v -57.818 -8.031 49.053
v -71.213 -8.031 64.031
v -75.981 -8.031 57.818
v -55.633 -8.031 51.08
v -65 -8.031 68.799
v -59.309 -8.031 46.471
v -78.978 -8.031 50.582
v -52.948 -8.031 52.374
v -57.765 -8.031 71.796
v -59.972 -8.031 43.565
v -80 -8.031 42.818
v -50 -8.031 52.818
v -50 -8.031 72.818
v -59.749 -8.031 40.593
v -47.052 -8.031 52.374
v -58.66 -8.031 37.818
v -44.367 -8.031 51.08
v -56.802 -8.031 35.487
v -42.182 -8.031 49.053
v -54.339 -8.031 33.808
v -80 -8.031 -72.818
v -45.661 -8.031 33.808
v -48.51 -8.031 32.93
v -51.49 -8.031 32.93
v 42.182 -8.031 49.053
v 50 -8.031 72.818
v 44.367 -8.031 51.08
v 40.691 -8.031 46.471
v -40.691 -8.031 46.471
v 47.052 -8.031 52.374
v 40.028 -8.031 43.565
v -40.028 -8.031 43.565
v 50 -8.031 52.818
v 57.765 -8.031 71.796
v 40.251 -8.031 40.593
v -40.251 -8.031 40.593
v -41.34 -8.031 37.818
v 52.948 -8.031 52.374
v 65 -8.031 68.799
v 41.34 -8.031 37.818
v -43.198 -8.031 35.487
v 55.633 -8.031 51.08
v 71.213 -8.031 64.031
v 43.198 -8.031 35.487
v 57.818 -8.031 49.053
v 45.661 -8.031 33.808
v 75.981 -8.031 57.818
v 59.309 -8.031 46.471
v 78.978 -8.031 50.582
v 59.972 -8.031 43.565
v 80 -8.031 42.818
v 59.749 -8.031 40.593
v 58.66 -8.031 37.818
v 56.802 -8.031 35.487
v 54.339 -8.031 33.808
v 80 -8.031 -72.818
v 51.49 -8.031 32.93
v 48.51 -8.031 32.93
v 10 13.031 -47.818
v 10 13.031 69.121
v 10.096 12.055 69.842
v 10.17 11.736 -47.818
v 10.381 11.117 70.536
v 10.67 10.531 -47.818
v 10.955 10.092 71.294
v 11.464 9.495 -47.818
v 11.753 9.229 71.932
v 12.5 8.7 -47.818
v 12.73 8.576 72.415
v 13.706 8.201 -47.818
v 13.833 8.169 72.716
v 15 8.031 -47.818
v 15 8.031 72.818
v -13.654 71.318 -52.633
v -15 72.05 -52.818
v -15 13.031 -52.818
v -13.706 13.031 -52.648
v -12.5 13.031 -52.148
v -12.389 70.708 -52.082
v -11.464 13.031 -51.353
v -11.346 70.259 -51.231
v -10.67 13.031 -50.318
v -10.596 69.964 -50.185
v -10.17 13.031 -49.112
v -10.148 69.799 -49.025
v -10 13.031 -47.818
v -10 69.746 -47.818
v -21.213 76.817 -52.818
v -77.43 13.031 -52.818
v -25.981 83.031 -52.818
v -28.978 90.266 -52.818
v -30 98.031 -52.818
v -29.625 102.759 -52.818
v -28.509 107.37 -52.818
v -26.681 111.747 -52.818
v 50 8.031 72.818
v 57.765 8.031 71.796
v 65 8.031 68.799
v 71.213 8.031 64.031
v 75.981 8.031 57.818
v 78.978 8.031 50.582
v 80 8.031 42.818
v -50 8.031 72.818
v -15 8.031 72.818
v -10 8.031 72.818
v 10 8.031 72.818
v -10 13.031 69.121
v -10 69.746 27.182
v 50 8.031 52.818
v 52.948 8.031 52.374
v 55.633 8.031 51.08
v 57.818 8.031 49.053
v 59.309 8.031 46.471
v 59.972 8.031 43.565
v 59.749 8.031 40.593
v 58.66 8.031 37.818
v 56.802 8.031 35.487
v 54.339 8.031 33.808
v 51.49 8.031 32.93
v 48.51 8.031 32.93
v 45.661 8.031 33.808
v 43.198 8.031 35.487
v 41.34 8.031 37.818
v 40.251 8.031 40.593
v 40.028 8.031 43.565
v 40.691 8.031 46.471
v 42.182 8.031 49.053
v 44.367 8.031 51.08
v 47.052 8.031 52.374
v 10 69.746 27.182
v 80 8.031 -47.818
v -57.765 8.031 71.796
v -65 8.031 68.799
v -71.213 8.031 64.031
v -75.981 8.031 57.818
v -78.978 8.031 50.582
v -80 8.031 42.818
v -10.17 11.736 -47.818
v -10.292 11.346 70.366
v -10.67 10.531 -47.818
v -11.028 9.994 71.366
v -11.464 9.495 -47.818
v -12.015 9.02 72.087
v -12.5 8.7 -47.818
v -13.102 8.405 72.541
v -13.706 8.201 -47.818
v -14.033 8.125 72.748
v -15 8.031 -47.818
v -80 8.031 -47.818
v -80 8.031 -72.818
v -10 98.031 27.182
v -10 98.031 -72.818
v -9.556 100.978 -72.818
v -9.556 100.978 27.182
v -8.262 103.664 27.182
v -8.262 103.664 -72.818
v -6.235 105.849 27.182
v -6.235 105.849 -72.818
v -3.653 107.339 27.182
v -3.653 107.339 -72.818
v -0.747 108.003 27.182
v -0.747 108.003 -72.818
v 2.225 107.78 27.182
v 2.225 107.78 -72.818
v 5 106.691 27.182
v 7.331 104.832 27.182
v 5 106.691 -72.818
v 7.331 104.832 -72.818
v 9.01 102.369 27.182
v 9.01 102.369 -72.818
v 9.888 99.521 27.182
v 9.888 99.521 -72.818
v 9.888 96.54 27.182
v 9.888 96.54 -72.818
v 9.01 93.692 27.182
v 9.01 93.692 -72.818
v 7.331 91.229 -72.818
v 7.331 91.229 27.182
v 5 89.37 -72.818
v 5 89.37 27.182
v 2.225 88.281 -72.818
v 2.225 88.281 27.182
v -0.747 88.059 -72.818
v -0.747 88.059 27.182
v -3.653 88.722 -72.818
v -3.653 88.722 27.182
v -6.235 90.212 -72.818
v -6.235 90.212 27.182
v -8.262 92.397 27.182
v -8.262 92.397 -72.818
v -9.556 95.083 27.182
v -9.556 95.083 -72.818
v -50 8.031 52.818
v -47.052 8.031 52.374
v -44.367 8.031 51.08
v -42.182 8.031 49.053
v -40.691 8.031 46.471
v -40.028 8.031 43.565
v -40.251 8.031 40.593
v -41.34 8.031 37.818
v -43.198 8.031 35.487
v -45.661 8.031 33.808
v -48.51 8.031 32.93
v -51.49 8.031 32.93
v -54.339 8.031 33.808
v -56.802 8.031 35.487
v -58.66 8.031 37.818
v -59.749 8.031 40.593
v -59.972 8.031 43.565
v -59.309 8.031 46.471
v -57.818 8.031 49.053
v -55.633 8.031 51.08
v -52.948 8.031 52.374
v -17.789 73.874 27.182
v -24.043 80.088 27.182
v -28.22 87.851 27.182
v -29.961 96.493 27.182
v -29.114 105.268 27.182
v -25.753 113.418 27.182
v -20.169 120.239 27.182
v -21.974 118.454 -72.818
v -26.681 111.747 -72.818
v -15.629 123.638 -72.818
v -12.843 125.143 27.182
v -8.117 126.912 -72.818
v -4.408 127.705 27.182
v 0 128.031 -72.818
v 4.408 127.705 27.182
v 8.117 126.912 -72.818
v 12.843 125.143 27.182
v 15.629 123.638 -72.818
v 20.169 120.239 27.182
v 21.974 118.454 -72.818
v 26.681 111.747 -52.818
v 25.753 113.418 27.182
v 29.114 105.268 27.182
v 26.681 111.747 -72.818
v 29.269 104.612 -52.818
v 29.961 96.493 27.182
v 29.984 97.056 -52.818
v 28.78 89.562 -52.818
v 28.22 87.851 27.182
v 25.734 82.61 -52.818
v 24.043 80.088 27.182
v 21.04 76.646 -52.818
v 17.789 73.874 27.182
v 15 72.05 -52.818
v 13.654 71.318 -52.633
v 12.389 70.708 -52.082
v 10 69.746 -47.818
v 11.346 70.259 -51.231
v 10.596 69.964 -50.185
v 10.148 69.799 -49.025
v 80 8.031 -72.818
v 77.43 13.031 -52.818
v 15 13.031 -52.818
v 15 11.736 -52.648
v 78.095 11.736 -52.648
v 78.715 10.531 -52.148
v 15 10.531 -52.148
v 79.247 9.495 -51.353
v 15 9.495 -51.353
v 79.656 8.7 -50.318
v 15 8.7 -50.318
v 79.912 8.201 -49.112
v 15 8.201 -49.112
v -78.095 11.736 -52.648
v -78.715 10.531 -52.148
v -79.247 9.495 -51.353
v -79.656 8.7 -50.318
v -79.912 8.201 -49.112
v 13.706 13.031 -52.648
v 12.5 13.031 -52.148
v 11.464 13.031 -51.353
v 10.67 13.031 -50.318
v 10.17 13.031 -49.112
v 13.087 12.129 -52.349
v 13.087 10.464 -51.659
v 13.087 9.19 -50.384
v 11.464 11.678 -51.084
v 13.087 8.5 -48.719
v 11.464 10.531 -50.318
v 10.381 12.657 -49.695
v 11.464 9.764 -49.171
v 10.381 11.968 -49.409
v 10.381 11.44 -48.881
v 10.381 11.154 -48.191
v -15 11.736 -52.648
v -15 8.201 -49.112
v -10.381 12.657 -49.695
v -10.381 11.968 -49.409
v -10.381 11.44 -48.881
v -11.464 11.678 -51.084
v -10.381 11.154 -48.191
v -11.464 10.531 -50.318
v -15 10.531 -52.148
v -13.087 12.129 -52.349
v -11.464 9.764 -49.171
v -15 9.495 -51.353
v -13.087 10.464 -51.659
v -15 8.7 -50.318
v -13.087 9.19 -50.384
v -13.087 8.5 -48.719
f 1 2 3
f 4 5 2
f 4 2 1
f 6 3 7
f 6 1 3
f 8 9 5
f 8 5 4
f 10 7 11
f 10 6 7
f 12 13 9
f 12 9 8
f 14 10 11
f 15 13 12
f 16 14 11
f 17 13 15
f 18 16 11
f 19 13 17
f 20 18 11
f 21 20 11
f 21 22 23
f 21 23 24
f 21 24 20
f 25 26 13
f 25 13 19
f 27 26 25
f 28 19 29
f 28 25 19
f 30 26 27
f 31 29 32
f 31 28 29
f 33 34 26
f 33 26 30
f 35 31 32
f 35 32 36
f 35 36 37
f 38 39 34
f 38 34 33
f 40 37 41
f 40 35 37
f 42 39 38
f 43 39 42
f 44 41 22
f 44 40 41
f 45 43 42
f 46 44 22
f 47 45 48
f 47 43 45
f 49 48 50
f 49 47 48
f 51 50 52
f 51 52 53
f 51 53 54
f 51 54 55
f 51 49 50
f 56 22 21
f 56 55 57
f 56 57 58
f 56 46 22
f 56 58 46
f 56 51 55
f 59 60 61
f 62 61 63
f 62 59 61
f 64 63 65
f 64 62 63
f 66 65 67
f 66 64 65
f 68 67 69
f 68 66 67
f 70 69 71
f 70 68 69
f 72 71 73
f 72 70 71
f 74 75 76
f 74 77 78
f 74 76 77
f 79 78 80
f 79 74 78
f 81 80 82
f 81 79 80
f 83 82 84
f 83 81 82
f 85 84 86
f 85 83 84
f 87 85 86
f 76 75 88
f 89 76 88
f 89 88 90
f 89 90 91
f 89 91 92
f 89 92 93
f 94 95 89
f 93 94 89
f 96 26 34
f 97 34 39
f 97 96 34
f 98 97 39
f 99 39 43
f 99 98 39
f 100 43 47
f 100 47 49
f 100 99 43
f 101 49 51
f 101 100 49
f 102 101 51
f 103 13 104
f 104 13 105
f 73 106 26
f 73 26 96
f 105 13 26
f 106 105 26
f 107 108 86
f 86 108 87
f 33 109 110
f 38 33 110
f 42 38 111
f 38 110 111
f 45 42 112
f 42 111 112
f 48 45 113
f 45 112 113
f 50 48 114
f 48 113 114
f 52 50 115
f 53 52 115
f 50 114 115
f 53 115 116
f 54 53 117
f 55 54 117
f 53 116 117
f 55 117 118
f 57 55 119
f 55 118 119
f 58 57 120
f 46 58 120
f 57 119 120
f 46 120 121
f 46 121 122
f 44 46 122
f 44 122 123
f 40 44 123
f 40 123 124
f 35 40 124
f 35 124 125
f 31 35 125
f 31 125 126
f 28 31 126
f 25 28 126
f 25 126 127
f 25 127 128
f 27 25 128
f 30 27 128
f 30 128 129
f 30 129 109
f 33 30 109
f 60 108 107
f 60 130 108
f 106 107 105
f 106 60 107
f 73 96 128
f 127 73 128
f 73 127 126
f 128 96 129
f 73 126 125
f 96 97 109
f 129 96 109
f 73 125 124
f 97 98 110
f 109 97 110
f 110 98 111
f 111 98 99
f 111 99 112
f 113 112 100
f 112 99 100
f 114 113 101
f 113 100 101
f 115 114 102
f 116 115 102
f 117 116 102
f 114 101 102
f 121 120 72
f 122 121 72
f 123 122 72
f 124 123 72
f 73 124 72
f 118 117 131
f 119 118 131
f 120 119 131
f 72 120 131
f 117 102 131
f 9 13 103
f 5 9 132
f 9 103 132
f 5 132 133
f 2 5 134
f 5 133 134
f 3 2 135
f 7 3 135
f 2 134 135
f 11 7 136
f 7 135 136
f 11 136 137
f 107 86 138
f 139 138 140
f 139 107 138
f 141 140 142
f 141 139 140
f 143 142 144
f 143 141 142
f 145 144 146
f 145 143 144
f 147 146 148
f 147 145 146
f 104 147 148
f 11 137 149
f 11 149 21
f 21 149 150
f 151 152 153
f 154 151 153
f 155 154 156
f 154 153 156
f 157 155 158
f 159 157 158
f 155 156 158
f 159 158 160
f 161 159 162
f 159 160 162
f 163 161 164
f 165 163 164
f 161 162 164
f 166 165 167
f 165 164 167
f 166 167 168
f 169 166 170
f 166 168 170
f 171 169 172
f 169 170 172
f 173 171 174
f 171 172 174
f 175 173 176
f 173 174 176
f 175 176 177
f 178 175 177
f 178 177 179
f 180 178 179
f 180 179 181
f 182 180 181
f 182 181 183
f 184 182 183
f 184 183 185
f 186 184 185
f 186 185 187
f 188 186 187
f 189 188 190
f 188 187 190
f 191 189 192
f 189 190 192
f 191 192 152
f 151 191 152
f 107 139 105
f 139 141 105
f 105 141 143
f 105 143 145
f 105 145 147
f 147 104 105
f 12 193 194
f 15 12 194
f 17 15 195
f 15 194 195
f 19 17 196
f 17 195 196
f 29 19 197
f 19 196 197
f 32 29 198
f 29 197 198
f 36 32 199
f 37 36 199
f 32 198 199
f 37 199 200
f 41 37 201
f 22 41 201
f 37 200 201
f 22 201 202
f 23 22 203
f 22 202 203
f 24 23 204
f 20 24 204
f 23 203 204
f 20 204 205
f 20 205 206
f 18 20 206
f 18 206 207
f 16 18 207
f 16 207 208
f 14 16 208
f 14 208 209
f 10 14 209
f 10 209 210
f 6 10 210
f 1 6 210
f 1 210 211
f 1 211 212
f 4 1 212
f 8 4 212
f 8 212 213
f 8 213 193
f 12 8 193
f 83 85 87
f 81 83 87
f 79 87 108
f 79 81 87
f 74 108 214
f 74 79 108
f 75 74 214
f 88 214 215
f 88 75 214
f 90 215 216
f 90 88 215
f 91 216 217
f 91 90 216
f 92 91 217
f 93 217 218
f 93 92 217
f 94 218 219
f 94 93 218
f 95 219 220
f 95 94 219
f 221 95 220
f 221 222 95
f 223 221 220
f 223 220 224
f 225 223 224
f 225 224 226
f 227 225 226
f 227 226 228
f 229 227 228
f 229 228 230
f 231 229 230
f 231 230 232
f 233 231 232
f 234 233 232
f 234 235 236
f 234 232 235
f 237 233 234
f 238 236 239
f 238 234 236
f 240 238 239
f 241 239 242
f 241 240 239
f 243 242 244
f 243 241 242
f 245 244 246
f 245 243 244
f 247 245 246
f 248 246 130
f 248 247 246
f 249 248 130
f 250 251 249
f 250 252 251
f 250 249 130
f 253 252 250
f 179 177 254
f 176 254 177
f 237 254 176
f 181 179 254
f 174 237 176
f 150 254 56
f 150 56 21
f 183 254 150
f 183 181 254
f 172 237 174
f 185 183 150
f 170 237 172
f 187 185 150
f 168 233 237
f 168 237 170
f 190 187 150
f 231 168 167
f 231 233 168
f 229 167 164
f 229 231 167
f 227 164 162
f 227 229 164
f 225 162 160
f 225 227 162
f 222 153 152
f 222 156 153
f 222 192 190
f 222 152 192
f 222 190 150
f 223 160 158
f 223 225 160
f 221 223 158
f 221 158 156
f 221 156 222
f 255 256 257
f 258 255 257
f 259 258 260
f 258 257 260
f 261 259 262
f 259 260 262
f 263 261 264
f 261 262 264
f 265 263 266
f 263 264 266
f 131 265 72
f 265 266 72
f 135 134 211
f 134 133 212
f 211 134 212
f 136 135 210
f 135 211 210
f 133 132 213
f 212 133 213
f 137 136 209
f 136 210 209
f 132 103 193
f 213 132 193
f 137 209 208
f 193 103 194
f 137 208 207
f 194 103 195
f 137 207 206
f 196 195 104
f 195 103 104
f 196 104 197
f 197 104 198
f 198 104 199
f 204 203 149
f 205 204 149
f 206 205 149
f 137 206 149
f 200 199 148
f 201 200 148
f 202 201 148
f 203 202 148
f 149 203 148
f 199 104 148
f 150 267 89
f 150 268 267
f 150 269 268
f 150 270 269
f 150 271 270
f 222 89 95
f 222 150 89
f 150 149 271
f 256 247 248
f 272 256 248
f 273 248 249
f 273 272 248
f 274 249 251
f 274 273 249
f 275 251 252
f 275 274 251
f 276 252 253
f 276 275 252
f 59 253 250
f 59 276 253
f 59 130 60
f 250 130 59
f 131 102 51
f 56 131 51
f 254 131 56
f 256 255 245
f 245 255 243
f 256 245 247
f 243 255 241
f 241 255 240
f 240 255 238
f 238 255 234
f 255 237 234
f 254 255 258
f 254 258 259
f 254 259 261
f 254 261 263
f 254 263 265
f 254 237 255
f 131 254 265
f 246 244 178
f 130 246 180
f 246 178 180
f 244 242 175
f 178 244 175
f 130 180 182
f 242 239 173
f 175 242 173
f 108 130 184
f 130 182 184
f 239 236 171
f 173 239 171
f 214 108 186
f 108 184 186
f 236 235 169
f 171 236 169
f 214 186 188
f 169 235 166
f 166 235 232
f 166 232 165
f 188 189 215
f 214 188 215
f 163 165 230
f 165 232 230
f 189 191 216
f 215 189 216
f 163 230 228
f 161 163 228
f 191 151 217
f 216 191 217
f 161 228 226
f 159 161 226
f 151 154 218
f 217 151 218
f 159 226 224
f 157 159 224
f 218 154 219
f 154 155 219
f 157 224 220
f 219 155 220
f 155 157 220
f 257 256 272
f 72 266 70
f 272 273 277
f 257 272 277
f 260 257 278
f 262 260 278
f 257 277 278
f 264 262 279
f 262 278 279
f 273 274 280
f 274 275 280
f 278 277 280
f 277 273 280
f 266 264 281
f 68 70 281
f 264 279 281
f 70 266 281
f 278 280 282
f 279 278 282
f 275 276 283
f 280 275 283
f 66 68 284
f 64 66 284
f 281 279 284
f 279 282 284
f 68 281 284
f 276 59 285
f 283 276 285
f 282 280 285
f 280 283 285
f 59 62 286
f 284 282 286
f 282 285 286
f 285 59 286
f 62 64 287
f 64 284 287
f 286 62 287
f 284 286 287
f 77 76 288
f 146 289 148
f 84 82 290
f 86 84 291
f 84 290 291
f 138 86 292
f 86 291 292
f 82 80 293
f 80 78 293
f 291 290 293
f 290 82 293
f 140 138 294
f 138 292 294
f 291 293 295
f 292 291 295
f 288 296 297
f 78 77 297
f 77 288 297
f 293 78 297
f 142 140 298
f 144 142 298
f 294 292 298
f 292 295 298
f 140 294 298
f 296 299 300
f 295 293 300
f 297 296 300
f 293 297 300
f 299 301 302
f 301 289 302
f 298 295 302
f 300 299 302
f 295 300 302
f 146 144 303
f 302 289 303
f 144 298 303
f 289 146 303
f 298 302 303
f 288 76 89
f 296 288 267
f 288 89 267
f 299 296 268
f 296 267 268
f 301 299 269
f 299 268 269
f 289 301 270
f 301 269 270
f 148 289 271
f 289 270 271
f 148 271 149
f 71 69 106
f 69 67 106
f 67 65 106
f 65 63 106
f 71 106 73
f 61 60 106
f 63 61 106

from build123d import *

# Parameters (mm, degrees)
SKETCH2_W            = 145.63575991
SKETCH2_H            = 16.06113598
BOSS_EXTRUDE1_DEPTH  = 80
SKETCH3_R            = 10
CUT_EXTRUDE1_DEPTH   = 110.363630747
BOSS_EXTRUDE2_DEPTH  = 20
SKETCH5_R            = 30
SKETCH5_R_2          = 10
BOSS_EXTRUDE3_DEPTH  = 100
FILLET1_R            = 5
BOSS_EXTRUDE9_REACH  = 183.085
BOSS_EXTRUDE10_DEPTH = 10
FILLET2_R            = 5
FILLET3_R            = 30


with BuildPart() as part:
    # Sketch2 → Boss-Extrude1 (new, symmetric)
    with BuildSketch(Plane(origin=(0, 0, 0), x_dir=(0, 0, -1), z_dir=(1, 0, 0))):
        Rectangle(SKETCH2_W, SKETCH2_H)
    extrude(amount=BOSS_EXTRUDE1_DEPTH, both=True)

    # Sketch3 → Cut-Extrude1 (cut, through all)
    with BuildSketch(Plane(origin=(0, 8.03056799, 0), x_dir=(1, 0, 0), z_dir=(0, 1, 0))):
        with Locations(Location((50, -42.817879955, 0), (0, 0, 270))):
            Circle(SKETCH3_R)
        with Locations(Location((-50, -42.817879955, 0), (0, 0, 270))):
            Circle(SKETCH3_R)
    extrude(amount=-CUT_EXTRUDE1_DEPTH, mode=Mode.SUBTRACT)

    # Sketch4 → Boss-Extrude2 (add)
    with BuildSketch(Plane(origin=(0, 0, -72.817879955), x_dir=(-1, 0, 0), z_dir=(0, 0, -1))):
        with BuildLine():
            Line((-26.680786367, 111.746822538), (-80, 8.03056799))
            Line((-80, 8.03056799), (80, 8.03056799))
            Line((80, 8.03056799), (26.680786367, 111.746822538))
            ThreePointArc((26.680786367, 111.746822538), (29.158391511, 105.086643705), (30, 98.03056799))
            ThreePointArc((30, 98.03056799), (-7.056075715, 68.872176479), (-26.680786367, 111.746822538))
        make_face()
    extrude(amount=-BOSS_EXTRUDE2_DEPTH)

    # Sketch5 → Boss-Extrude3 (add)
    with BuildSketch(Plane(origin=(0, 0, -72.817879955), x_dir=(-1, 0, 0), z_dir=(0, 0, -1))):
        with Locations((0, 98.03056799)):
            Circle(SKETCH5_R)
        with Locations((0, 98.03056799)):
            Circle(SKETCH5_R_2, mode=Mode.SUBTRACT)
    extrude(amount=-BOSS_EXTRUDE3_DEPTH)

    # Fillet1
    fillet1_edges = [part.edges().sort_by_distance(p)[0] for p in [
        (0, 8.03056799, -52.817879955),
    ]]
    fillet(fillet1_edges, radius=FILLET1_R)

    # Boss-Extrude9: up to this face of the body (flat: up to its plane)
    boss_extrude9_end = Plane(part.part.faces().sort_by_distance((0, 43.997298741, -52.817879955))[0])
    # Sketch12 → Boss-Extrude9 (add, up to the picked face)
    with BuildSketch(Plane.XY.offset(27.182120045), mode=Mode.PRIVATE) as boss_extrude9_sk1:
        with BuildLine():
            Line((10, 69.746296743), (10, 8.03056799))
            Line((10, 8.03056799), (-10, 8.03056799))
            Line((-10, 8.03056799), (-10, 69.746296743))
            ThreePointArc((-10, 69.746296743), (0, 68.03056799), (10, 69.746296743))
        make_face()
    boss_extrude9_tool1 = split(extrude(boss_extrude9_sk1.sketch, amount=-BOSS_EXTRUDE9_REACH, mode=Mode.PRIVATE), bisect_by=boss_extrude9_end, keep=Keep.BOTH, mode=Mode.PRIVATE)
    add(boss_extrude9_tool1.solids().sort_by(Axis((0, 38.315311, 27.18212), (0, 0, -1)))[0])

    # Sketch14 → Boss-Extrude10 (add, symmetric)
    with BuildSketch(Plane(origin=(0, 0, 0), x_dir=(0, 0, -1), z_dir=(1, 0, 0))):
        Polygon((-27.182120045, 69.746296743), (-72.817879955, 8.03056799), (-27.182120045, 8.03056799), align=None)
    extrude(amount=BOSS_EXTRUDE10_DEPTH, both=True)

    # Fillet2
    # the kernel refuses this fillet: 5 mm, written as the material it adds along each edge
    with BuildSketch(Plane(origin=(10, 13.03056799, -47.817879955), x_dir=(0, 0, -1), z_dir=(0, 1, 0))) as fillet2_piece_1:
        with BuildLine():
            CenterArc((5 - FILLET2_R, -FILLET2_R), FILLET2_R, 0, 90)
            Line((5, -FILLET2_R), (5, 0))
            Line((5, 0), (5 - FILLET2_R, 0))
        make_face()
    revolve(axis=Axis((10, 13.03056799, -47.817879955), (-1, 0, 0)), revolution_arc=90)
    with BuildSketch(Plane(origin=(-10, 13.03056799, -47.817879955), x_dir=(0, 0, -1), z_dir=(0, 1, 0))) as fillet2_piece_2:
        with BuildLine():
            CenterArc((5 - FILLET2_R, FILLET2_R), FILLET2_R, 270, 90)
            Line((5, FILLET2_R), (5, 0))
            Line((5, 0), (5 - FILLET2_R, 0))
        make_face()
    revolve(axis=Axis((-10, 13.03056799, -47.817879955), (-1, 0, 0)), revolution_arc=90)
    with BuildSketch(Plane(origin=(-10, 8.03056799, 72.817879955), x_dir=(-1, 0, 0), z_dir=(0, 0, -1))) as fillet2_piece_3_section:
        with BuildLine():
            CenterArc((FILLET2_R, FILLET2_R), FILLET2_R, 180, 90)
            Line((0, FILLET2_R), (0, 0))
            Line((0, 0), (FILLET2_R, 0))
        make_face()
    fillet2_piece_3 = extrude(amount=120.63575991, mode=Mode.PRIVATE)
    fillet2_piece_3 = split(fillet2_piece_3, bisect_by=Plane(origin=(-10, 8.03056799, 72.817879955), z_dir=(0, -0.5945577575874679, -0.8040529042871258)), keep=Keep.TOP, mode=Mode.PRIVATE)
    add(fillet2_piece_3)
    with BuildSketch(Plane(origin=(-10, 82.246296743, -52.817879955), x_dir=(0, 0, 1), z_dir=(0, -1, 0))) as fillet2_piece_4:
        with BuildLine():
            CenterArc((FILLET2_R, FILLET2_R), FILLET2_R, 180, 90)
            Line((0, FILLET2_R), (0, 0))
            Line((0, 0), (FILLET2_R, 0))
        make_face()
    extrude(amount=69.215728753)
    with BuildSketch(Plane(origin=(10, 13.03056799, -52.817879955), x_dir=(1, 0, 0), z_dir=(0, 1, 0))) as fillet2_piece_5:
        with BuildLine():
            CenterArc((FILLET2_R, -FILLET2_R), FILLET2_R, 90, 90)
            Line((0, -FILLET2_R), (0, 0))
            Line((0, 0), (FILLET2_R, 0))
        make_face()
    extrude(amount=69.215728753)
    with BuildSketch(Plane(origin=(10, 8.03056799, -47.817879955), x_dir=(1, 0, 0), z_dir=(0, 0, 1))) as fillet2_piece_6_section:
        with BuildLine():
            CenterArc((FILLET2_R, FILLET2_R), FILLET2_R, 180, 90)
            Line((0, FILLET2_R), (0, 0))
            Line((0, 0), (FILLET2_R, 0))
        make_face()
    fillet2_piece_6 = extrude(amount=120.63575991, mode=Mode.PRIVATE)
    fillet2_piece_6 = split(fillet2_piece_6, bisect_by=Plane(origin=(10, 65.701203771, 30.173268256), z_dir=(0, -0.5945577575874679, -0.8040529042871258)), keep=Keep.TOP, mode=Mode.PRIVATE)
    add(fillet2_piece_6)

    # Fillet3
    fillet3_edges = [part.edges().sort_by_distance(p)[0] for p in [
        (80, 0, 72.817879955),
        (-80, 0, 72.817879955),
    ]]
    fillet(fillet3_edges, radius=FILLET3_R)


solid = part.part
